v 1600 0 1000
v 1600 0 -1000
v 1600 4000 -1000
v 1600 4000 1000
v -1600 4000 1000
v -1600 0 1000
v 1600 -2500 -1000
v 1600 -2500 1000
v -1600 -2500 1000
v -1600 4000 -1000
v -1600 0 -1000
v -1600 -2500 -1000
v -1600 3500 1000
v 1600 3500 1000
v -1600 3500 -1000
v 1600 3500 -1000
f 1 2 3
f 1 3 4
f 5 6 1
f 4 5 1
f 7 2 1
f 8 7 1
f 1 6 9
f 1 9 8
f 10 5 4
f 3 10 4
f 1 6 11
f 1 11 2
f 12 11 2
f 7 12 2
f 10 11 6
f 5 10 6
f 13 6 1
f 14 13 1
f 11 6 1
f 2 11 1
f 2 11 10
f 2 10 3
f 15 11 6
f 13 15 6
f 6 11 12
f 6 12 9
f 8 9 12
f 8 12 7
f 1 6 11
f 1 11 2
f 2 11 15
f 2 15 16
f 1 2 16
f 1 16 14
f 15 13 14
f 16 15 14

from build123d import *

# Parameters (mm, degrees)
F0_W     = 3200
F0_H     = 2000
F1_DEPTH = 2500
F2_DEPTH = 3500
F3_DEPTH = 4000


with BuildPart() as f1:
    # F0 (on Front) → F1 (new body)
    with BuildSketch(Plane.XZ):
        Rectangle(F0_W, F0_H)
    extrude(amount=F1_DEPTH)


with BuildPart() as f2:
    # F0 (on Front) → F2 (new body)
    with BuildSketch(Plane.XZ):
        Rectangle(F0_W, F0_H)
    extrude(amount=-F2_DEPTH)


with BuildPart() as f3:
    # F0 (on Front) → F3 (new body)
    with BuildSketch(Plane.XZ):
        Rectangle(F0_W, F0_H)
    extrude(amount=-F3_DEPTH)


solid = Compound([f1.part, f2.part, f3.part])
